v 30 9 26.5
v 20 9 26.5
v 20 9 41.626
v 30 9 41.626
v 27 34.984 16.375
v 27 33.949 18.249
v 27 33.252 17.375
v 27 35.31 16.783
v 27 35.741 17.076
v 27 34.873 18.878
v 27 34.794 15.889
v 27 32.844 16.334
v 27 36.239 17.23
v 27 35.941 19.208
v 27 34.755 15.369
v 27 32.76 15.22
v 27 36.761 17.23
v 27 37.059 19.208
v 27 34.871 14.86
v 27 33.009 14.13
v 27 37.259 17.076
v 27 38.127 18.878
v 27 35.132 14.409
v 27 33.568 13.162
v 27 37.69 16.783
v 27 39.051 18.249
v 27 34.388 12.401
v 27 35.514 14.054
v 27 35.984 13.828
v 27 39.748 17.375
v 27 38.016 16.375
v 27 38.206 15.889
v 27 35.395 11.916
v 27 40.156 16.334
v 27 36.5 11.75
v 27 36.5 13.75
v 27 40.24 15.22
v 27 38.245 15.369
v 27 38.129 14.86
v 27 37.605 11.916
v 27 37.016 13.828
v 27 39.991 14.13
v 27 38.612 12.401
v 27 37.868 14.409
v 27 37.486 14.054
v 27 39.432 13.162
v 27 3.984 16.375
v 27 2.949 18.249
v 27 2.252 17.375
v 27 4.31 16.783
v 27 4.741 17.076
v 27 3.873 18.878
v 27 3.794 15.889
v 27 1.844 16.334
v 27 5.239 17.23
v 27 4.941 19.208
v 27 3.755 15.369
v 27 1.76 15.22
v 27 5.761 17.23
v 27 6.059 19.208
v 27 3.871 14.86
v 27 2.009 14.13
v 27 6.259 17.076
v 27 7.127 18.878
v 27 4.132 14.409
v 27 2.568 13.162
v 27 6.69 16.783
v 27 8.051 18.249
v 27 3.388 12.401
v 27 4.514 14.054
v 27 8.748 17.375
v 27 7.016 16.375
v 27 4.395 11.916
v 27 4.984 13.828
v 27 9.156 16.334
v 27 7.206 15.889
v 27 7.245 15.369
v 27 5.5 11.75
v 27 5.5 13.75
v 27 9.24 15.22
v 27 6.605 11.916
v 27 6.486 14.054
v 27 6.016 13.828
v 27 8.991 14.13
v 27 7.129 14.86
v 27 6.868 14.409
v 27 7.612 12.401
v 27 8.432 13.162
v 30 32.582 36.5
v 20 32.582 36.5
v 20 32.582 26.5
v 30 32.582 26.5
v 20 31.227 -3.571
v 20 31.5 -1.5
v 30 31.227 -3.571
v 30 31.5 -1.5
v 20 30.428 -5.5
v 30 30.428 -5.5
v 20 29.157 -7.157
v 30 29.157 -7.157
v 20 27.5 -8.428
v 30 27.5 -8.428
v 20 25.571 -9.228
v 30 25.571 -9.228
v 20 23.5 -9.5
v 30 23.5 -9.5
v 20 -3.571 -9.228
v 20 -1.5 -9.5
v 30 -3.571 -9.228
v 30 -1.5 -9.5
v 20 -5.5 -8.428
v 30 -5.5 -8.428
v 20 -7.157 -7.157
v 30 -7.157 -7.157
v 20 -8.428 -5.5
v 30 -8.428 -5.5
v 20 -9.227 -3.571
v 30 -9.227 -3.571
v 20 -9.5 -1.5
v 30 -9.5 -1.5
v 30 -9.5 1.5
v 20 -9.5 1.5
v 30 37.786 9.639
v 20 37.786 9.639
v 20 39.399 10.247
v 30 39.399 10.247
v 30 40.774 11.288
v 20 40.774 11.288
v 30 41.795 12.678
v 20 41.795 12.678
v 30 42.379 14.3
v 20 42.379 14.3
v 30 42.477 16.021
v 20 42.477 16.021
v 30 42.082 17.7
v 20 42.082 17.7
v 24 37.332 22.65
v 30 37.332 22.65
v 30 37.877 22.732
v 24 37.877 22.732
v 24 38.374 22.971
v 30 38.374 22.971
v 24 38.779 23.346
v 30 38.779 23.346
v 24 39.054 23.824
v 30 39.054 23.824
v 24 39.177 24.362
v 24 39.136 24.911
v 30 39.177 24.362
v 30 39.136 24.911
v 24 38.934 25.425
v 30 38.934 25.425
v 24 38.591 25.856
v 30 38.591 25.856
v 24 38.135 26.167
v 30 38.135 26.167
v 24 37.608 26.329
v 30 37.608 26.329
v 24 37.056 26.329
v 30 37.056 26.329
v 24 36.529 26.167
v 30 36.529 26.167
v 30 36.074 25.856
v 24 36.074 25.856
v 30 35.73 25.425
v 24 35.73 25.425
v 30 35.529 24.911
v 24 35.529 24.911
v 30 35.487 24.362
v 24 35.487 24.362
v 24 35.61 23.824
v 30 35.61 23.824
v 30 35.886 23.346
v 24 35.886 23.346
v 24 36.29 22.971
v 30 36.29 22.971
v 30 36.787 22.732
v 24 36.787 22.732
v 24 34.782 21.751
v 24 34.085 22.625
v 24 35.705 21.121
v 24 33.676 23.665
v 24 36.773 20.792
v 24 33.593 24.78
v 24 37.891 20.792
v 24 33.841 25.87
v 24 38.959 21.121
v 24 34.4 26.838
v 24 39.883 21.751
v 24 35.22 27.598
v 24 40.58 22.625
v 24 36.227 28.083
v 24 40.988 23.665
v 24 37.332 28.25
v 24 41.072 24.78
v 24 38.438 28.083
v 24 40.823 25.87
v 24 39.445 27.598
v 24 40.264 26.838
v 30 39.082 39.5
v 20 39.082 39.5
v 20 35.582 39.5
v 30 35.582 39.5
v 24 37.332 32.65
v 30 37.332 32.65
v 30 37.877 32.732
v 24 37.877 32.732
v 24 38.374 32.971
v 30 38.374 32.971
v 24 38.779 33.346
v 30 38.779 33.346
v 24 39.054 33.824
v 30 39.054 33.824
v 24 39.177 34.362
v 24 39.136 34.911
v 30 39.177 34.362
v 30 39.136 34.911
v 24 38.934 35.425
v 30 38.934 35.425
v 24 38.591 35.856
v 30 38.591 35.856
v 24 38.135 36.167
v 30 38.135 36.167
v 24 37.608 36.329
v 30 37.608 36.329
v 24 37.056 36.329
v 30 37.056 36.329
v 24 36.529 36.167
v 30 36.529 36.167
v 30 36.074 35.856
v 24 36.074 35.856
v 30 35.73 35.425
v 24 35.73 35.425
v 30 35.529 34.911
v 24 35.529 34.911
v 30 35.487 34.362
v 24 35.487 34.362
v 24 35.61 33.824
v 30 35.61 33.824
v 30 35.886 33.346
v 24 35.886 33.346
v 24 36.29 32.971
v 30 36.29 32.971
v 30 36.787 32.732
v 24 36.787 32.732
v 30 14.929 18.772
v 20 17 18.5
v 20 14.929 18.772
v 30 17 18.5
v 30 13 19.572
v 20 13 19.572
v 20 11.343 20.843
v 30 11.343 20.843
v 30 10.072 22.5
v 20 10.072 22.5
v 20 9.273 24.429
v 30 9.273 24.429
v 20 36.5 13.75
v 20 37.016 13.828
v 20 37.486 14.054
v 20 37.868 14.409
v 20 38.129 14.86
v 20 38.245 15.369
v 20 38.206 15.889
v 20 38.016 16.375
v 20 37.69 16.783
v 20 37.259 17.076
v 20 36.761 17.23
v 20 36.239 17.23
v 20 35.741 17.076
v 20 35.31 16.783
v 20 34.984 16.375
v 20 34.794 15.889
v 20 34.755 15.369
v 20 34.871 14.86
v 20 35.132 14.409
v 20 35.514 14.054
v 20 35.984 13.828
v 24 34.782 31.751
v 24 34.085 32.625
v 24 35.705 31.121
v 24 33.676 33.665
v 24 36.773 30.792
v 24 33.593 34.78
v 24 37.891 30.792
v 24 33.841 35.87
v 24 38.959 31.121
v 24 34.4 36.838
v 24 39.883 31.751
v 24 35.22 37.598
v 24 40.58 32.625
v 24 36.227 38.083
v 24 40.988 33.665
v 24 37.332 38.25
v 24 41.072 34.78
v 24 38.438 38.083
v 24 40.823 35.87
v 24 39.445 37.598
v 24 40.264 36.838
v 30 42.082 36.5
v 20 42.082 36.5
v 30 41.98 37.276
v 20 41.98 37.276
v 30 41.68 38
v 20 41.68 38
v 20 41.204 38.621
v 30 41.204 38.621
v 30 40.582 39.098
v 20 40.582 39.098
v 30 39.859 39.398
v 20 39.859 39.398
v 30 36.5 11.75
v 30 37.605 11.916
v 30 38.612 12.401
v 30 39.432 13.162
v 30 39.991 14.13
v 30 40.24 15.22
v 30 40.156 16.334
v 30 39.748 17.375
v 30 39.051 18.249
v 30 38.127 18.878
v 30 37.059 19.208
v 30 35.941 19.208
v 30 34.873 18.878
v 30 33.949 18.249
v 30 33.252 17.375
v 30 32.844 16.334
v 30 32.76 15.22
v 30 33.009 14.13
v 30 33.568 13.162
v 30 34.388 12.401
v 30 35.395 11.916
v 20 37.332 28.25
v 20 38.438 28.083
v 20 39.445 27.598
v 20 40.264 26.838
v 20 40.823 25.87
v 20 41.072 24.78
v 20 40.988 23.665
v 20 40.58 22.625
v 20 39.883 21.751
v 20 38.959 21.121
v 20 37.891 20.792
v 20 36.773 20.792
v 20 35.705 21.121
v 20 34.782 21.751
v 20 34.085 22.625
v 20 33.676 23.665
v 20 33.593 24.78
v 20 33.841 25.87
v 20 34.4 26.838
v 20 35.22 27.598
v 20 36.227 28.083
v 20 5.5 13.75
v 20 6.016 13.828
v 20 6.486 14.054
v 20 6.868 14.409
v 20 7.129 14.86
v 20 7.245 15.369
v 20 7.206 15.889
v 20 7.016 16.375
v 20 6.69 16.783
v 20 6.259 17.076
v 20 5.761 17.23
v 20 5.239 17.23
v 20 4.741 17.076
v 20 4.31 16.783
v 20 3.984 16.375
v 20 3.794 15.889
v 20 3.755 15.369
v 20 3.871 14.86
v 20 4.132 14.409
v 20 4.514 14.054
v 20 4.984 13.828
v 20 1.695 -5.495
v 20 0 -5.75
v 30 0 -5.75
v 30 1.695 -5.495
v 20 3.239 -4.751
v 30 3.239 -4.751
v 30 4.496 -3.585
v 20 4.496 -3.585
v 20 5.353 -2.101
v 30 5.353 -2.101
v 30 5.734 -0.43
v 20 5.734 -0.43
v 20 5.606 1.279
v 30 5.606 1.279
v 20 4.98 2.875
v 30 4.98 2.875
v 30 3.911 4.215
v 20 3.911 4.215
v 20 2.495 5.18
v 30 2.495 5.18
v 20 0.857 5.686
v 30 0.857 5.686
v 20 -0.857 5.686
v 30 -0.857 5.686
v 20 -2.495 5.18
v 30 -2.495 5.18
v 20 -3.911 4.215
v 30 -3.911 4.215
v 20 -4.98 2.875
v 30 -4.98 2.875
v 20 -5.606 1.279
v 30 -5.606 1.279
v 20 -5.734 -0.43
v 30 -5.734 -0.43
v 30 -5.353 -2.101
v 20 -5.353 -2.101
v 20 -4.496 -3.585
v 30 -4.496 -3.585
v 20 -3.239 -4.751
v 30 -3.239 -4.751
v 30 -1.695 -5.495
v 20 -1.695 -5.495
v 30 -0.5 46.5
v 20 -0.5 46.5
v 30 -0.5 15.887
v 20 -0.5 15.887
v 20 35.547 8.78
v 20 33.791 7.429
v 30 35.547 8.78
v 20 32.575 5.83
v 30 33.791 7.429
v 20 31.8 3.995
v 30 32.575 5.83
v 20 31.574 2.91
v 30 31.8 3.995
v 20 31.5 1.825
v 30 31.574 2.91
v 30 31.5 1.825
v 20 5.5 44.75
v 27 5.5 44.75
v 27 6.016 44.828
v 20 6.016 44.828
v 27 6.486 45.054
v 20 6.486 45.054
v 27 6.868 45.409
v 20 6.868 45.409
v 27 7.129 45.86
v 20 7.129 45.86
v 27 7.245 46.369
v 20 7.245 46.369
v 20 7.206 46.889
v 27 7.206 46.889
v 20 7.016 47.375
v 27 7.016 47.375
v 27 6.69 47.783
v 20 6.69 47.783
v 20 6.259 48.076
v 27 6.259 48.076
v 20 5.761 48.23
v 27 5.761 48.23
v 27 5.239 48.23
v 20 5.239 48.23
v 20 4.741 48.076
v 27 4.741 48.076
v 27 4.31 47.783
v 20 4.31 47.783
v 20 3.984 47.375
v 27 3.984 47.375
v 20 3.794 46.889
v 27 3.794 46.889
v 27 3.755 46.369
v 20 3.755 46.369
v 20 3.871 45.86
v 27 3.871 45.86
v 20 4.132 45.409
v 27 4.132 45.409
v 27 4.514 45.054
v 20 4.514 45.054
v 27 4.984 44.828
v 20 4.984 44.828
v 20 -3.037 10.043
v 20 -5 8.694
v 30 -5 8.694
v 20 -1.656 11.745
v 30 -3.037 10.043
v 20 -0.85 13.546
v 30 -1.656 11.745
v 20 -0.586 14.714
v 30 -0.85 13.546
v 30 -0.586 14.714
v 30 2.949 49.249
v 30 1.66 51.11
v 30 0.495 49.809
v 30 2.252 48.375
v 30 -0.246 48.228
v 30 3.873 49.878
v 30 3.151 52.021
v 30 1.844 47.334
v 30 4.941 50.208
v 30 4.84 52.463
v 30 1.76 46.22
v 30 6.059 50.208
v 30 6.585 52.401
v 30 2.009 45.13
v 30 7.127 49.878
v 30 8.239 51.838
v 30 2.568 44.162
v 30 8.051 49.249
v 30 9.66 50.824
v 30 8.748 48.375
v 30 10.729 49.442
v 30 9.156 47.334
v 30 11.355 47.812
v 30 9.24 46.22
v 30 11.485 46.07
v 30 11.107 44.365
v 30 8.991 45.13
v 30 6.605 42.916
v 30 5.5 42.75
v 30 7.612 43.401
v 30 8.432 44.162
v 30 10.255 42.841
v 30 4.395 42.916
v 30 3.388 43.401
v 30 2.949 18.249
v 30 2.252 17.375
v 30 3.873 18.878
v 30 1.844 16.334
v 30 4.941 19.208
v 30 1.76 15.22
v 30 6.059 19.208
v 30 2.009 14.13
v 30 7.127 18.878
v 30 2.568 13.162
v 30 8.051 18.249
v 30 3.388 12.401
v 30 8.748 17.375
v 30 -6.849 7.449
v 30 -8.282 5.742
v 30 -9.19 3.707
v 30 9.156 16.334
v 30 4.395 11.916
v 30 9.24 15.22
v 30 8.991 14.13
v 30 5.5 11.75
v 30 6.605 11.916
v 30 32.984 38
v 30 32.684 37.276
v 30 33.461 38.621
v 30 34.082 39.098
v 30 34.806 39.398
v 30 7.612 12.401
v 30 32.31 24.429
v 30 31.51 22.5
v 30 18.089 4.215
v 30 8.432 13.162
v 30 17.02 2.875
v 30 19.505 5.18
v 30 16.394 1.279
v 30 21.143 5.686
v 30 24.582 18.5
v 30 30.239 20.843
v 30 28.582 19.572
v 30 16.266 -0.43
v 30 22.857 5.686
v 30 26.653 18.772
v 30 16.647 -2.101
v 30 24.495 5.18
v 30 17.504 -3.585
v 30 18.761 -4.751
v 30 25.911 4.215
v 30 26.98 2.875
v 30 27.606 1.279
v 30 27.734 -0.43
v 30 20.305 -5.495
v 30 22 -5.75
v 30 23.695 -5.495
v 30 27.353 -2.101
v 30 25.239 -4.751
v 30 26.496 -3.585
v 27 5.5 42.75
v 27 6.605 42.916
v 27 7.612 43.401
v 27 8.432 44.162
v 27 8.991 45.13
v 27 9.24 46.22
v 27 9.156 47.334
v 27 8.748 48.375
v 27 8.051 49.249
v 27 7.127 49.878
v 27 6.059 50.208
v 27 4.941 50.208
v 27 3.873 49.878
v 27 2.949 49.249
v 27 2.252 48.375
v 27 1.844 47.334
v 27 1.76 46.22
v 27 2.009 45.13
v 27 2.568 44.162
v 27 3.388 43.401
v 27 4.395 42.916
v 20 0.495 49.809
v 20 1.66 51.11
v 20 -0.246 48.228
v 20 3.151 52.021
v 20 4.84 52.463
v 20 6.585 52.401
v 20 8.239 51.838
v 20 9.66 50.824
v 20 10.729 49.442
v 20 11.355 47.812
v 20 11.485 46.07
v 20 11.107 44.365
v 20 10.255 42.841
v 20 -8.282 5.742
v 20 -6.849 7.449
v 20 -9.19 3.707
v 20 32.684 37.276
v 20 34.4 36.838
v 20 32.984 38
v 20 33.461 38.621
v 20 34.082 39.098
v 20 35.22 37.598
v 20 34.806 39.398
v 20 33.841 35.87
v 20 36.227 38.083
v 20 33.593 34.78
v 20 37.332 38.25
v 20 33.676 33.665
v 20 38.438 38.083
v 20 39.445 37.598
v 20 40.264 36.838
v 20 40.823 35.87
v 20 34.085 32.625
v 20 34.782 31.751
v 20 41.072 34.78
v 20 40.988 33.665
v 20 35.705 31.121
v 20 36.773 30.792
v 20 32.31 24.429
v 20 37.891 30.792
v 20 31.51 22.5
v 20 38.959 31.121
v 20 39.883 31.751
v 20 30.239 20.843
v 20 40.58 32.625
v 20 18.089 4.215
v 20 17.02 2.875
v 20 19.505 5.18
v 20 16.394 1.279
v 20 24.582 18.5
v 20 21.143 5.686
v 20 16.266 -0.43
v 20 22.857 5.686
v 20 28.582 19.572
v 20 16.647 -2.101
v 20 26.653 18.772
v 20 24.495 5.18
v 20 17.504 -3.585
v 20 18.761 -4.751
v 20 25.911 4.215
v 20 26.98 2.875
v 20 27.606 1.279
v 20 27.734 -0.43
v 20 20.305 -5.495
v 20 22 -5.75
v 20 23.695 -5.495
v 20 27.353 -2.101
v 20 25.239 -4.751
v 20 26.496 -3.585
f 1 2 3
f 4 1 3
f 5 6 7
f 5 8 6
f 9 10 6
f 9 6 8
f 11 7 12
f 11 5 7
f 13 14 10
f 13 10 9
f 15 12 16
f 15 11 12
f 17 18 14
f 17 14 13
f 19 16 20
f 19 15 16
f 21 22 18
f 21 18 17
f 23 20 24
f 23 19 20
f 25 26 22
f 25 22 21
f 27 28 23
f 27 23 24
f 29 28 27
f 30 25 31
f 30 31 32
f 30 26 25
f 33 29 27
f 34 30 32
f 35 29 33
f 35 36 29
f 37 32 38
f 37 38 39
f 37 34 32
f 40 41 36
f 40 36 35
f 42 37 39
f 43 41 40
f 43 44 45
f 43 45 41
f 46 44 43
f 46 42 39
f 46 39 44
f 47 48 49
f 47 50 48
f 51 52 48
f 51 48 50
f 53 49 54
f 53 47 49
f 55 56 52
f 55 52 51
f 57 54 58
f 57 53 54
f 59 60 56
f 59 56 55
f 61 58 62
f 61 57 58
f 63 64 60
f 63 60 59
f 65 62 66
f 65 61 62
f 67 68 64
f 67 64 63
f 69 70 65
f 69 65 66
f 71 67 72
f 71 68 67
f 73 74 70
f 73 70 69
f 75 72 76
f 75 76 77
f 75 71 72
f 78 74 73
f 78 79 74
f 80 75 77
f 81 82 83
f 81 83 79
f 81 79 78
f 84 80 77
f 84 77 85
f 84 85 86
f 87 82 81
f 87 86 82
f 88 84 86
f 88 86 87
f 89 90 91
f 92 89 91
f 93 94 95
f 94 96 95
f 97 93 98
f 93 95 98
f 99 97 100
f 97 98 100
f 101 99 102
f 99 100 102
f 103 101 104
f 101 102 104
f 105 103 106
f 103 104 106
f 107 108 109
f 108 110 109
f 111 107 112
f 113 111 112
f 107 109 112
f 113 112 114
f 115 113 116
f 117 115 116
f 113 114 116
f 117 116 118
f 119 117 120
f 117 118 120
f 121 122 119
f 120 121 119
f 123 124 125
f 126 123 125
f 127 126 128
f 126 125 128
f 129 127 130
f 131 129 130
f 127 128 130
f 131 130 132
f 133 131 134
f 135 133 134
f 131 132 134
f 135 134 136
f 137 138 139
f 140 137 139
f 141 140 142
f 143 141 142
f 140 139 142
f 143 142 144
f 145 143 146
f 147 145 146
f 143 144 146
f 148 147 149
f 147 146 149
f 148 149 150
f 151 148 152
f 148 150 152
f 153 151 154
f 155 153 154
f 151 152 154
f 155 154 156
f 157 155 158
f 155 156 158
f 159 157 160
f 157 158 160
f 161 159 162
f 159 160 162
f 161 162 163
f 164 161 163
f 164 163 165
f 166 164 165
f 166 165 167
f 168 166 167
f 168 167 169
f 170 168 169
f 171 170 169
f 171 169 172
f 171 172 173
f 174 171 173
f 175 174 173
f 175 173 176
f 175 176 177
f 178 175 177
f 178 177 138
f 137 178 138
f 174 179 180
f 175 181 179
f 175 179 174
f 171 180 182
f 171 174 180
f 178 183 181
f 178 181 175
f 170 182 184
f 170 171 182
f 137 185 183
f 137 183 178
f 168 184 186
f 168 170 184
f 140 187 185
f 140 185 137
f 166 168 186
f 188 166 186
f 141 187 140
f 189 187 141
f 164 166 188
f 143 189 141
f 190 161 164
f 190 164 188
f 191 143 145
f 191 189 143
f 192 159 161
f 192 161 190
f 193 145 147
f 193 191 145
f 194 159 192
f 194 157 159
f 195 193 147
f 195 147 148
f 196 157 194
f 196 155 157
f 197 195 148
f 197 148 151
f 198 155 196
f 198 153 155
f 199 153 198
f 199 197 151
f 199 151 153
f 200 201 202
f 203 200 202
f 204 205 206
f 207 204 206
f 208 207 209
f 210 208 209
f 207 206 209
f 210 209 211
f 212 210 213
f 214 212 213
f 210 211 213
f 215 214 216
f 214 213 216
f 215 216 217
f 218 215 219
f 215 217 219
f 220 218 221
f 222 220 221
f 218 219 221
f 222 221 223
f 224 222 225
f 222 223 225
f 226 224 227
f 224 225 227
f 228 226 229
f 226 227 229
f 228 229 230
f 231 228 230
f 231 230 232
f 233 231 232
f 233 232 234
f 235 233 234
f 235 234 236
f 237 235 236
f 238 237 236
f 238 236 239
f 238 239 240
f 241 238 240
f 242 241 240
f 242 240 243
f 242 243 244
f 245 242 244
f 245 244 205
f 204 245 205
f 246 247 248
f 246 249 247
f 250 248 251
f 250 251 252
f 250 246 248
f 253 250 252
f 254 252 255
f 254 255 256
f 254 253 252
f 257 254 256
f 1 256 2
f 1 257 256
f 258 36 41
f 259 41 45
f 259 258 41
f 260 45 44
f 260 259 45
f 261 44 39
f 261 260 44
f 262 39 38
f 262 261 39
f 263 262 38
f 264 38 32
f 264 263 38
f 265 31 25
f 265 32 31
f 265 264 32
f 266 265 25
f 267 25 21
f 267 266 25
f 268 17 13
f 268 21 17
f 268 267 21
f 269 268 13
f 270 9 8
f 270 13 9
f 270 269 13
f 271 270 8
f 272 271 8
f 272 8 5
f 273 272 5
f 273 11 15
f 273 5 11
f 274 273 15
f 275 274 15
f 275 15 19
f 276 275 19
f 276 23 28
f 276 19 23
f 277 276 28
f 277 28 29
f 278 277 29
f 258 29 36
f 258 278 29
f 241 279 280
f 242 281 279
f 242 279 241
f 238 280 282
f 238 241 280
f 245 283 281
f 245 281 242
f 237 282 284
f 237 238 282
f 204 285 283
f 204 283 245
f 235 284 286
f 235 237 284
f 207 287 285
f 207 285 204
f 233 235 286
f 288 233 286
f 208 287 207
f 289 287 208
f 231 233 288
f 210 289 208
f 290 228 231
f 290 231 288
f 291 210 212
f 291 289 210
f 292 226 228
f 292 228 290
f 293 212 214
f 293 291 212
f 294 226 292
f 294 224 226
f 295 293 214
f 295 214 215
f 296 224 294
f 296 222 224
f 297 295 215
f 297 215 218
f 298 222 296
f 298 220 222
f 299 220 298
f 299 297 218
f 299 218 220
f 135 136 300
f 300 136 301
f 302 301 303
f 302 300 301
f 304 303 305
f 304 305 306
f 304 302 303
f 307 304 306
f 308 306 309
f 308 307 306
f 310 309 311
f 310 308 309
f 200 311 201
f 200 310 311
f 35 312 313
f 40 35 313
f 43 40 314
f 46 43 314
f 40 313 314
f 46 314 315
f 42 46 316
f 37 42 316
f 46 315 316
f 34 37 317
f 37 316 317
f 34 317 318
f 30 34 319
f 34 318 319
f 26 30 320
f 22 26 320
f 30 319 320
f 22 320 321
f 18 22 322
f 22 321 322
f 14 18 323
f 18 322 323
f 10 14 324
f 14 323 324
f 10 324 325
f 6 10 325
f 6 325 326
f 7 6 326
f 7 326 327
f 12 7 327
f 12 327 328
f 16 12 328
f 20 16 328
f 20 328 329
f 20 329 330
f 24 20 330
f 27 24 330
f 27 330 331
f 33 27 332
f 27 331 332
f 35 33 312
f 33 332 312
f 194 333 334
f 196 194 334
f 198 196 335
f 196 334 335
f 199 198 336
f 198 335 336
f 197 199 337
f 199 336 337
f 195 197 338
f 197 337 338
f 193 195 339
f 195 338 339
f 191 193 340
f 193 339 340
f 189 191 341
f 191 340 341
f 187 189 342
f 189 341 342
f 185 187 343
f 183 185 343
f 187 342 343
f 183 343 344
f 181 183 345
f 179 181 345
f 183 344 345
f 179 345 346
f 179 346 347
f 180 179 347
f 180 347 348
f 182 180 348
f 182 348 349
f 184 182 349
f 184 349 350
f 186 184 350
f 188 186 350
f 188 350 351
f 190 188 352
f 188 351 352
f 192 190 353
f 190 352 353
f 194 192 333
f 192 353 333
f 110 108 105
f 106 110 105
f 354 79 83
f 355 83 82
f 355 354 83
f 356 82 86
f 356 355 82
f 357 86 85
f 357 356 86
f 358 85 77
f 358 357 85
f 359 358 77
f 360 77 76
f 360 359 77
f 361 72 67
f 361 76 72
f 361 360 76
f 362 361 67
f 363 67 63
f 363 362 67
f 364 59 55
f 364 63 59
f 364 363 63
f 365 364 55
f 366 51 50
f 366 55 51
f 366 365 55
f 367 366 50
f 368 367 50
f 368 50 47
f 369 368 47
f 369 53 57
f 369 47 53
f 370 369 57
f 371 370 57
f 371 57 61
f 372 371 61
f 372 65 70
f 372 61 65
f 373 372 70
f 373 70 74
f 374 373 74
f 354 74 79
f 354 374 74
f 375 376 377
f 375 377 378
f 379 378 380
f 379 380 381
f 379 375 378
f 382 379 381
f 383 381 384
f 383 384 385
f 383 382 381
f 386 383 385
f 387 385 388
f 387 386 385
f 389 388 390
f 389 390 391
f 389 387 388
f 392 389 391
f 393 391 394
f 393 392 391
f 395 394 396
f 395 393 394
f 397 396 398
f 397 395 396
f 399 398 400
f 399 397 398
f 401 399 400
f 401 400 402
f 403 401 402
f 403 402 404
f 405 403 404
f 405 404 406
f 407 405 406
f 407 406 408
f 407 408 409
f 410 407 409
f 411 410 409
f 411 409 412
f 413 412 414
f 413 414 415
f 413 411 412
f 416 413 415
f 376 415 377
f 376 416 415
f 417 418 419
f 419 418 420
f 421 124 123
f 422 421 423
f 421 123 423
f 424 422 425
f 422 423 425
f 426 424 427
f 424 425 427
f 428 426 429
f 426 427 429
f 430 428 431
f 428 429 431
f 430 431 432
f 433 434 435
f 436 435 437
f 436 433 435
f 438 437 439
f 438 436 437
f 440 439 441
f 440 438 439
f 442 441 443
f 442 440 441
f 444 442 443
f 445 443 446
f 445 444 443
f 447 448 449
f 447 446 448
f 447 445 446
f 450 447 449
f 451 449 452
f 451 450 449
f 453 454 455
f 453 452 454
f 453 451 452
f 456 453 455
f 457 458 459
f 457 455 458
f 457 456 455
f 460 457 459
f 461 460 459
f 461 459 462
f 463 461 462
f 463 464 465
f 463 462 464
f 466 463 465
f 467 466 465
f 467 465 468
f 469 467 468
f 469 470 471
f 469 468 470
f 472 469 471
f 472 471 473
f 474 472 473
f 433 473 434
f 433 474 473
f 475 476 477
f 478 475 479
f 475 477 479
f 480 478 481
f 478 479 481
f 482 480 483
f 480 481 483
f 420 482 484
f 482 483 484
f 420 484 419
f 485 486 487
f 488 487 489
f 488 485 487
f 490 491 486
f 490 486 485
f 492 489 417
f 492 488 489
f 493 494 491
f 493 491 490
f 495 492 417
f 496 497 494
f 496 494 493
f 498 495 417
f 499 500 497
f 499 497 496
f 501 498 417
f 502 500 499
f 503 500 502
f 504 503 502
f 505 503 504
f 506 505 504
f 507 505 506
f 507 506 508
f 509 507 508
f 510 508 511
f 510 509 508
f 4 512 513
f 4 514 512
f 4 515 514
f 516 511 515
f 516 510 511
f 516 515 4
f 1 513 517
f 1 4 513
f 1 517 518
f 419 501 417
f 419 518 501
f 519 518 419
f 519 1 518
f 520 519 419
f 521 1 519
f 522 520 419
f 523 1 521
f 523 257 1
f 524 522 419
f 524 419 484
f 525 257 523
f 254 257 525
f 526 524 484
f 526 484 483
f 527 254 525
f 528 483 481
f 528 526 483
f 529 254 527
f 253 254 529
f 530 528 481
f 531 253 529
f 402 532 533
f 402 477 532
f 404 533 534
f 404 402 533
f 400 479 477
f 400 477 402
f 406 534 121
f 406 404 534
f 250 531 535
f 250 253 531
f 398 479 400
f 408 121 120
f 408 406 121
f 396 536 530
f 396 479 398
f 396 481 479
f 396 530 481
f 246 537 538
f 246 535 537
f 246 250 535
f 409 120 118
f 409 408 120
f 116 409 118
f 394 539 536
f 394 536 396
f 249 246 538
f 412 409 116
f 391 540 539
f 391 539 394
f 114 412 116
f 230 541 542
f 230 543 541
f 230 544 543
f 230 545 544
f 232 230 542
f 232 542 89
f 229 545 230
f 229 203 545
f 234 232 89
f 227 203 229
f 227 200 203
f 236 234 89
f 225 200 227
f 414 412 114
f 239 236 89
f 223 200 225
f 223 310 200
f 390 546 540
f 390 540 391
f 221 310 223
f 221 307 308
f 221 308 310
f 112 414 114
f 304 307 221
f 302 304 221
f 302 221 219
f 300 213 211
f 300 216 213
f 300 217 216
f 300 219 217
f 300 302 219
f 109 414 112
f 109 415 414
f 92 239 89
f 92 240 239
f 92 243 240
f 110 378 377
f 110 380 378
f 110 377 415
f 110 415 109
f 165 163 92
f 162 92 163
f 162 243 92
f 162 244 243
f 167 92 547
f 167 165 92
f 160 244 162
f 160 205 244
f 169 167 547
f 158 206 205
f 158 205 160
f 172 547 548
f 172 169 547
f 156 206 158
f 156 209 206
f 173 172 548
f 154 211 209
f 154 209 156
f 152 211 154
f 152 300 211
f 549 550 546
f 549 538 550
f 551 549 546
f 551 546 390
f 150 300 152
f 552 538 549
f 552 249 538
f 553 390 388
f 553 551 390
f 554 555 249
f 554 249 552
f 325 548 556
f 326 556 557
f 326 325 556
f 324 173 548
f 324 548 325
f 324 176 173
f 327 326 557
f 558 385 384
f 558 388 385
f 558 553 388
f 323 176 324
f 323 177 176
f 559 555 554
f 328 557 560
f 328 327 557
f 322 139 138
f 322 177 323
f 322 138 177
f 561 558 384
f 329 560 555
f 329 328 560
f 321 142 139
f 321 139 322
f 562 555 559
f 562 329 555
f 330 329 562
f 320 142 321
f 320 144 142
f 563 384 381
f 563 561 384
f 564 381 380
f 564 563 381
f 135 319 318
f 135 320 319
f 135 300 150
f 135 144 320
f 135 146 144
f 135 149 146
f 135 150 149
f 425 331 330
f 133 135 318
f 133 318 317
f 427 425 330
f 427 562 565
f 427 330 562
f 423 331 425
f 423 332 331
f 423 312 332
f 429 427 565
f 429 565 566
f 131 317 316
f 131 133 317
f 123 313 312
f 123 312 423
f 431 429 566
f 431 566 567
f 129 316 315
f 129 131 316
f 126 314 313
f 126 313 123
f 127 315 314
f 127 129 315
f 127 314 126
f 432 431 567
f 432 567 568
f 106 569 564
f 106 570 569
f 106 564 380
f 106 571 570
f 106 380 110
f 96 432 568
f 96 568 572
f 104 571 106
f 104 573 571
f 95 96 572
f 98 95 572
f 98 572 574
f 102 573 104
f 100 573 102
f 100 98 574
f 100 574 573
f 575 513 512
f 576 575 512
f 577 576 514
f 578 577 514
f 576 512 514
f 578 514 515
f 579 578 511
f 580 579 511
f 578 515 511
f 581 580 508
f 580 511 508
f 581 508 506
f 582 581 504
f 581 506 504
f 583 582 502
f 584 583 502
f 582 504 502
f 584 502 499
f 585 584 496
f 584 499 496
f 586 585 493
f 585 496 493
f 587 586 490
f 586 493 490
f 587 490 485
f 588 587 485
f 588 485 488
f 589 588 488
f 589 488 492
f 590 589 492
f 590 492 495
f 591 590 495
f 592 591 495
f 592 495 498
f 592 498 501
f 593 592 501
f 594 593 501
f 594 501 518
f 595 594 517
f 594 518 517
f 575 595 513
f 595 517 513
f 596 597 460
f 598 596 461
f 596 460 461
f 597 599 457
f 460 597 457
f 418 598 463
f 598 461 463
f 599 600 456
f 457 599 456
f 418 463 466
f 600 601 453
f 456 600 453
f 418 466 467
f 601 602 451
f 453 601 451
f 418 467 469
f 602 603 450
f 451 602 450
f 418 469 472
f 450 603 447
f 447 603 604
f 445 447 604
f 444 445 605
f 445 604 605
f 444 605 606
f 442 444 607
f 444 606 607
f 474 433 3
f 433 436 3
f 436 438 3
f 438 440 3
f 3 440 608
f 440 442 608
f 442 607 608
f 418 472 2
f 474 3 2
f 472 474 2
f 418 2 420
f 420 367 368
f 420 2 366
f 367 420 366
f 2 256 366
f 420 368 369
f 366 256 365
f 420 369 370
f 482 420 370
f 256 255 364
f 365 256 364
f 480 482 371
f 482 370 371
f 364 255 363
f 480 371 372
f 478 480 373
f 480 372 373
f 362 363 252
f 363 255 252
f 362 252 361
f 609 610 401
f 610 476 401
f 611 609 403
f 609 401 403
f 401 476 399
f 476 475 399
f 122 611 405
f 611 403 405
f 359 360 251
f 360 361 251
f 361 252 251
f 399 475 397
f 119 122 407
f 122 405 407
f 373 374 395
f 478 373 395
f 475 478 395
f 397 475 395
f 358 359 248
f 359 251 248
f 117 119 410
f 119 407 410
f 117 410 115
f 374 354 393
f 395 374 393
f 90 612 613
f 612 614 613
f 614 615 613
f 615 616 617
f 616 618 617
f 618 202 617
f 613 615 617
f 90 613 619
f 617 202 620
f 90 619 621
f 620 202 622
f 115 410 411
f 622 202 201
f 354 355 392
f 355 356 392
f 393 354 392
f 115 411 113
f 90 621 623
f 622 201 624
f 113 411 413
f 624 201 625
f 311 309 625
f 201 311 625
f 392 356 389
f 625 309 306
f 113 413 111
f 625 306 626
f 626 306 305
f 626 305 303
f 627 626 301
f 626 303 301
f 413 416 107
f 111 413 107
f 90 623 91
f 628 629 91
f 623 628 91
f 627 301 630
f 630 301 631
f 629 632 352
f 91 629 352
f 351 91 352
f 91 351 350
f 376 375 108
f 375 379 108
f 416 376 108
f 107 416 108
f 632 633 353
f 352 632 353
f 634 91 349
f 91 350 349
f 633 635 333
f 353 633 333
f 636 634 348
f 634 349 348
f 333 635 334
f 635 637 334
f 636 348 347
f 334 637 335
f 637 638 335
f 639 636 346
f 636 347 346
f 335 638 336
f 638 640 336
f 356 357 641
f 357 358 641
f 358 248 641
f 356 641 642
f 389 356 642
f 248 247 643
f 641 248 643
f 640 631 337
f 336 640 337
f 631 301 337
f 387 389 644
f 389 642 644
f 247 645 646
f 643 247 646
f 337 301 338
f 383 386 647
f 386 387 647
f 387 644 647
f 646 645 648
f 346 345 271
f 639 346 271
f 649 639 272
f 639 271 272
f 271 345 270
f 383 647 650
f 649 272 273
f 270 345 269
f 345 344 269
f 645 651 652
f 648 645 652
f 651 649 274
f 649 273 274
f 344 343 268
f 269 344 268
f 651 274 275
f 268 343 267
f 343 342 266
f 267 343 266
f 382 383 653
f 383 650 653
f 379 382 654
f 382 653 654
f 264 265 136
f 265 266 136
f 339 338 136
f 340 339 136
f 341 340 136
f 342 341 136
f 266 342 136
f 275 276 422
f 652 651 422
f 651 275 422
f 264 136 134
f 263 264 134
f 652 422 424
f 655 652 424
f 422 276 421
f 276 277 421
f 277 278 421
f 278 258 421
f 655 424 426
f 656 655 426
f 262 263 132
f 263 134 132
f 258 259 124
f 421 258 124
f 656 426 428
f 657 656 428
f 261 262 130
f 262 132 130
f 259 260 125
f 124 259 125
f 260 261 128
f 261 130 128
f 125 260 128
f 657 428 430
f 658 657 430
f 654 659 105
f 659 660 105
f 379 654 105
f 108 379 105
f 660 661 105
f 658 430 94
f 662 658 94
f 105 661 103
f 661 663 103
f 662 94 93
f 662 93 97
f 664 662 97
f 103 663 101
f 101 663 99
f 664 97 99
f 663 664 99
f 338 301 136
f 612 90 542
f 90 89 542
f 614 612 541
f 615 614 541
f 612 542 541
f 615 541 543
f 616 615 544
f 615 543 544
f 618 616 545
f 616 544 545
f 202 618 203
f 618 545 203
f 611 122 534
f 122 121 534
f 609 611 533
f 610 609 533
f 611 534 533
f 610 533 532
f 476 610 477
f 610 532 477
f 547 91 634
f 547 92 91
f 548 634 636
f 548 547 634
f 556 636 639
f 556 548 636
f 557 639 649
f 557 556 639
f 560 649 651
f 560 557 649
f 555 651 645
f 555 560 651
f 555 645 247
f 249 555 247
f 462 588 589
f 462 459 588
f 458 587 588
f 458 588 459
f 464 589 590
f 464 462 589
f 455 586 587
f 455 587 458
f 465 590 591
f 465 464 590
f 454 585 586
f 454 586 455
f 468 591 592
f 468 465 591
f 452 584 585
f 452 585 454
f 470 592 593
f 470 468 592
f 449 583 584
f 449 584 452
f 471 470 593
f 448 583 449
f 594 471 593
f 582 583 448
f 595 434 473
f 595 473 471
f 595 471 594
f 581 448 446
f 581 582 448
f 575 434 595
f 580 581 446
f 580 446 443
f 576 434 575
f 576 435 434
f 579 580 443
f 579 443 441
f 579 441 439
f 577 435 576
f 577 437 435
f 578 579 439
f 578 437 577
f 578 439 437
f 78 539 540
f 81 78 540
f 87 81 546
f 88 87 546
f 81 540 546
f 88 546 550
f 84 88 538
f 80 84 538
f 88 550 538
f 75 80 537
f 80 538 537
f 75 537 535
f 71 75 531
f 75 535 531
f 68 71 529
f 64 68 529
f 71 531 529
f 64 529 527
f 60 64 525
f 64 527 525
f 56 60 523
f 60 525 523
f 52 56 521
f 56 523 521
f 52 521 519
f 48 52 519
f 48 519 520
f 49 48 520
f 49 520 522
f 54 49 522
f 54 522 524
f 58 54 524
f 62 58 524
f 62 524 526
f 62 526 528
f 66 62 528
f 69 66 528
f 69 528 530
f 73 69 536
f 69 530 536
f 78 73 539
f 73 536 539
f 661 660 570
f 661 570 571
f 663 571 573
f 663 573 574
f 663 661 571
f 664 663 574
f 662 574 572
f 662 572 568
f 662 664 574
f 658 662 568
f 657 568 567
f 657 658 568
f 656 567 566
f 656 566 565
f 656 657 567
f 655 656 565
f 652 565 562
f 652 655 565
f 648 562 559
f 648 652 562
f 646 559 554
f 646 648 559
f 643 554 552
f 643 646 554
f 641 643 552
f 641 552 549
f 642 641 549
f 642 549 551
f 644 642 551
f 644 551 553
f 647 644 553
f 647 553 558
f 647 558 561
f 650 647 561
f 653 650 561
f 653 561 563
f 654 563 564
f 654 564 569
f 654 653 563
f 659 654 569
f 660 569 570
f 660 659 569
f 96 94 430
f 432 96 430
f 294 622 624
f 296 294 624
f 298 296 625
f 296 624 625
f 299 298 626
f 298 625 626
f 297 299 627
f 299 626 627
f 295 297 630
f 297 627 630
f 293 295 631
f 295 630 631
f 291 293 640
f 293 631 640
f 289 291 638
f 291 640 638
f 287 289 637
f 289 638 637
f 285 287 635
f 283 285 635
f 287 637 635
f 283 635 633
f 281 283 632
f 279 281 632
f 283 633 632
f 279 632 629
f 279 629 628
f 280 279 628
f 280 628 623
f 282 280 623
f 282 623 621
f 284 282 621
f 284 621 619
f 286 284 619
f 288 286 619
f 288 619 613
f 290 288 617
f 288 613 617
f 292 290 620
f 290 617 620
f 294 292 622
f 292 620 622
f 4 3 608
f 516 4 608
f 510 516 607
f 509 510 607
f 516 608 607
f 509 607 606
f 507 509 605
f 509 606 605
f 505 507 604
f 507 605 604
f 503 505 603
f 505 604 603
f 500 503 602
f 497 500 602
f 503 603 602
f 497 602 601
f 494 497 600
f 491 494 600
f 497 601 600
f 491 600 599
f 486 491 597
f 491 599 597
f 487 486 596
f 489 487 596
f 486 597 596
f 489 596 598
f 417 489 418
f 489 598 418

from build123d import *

# Parameters (mm, degrees)
SKETCH1_R           = 1.75
SKETCH1_R_2         = 5.75
BOSS_EXTRUDE3_DEPTH = 10
FILLET1_R           = 8
SKETCH6_R           = 3.75
CUT_EXTRUDE2_DEPTH  = 3
FILLET2_R           = 8
FILLET3_R           = 3
SKETCH8_R           = 1.85
CUT_EXTRUDE3_DEPTH  = 69.282336686
SKETCH9_R           = 3.75
CUT_EXTRUDE4_DEPTH  = 4


with BuildPart() as part:
    # Sketch1 → Boss-Extrude3 (new body)
    with BuildSketch(Plane(origin=(20, 0, 0), x_dir=(0, 0, -1), z_dir=(1, 0, 0))):
        with BuildLine():
            Line((-17.699617141, 42.082180663), (-39.499785546, 42.082180663))
            Line((-39.499785546, 42.082180663), (-39.499785546, 32.582180663))
            Line((-39.499785546, 32.582180663), (-18.499785546, 32.582180663))
            Line((-18.499785546, 32.582180663), (-18.499785546, 9))
            Line((-18.499785546, 9), (-41.626388373, 9))
            ThreePointArc((-41.626388373, 9), (-51.838324672, 8.238612788), (-46.499785546, -0.5))
            Line((-46.499785546, -0.5), (-9.499785546, -0.5))
            Line((-9.499785546, -0.5), (-9.499785546, -9.5))
            Line((-9.499785546, -9.5), (9.500214454, -9.5))
            Line((9.500214454, -9.5), (9.500214454, 31.5))
            Line((9.500214454, 31.5), (-9.499785546, 31.5))
            Line((-9.499785546, 31.5), (-9.499785546, 36.5))
            ThreePointArc((-9.499785546, 36.5), (-12.123322128, 41.459787776), (-17.699617141, 42.082180663))
        make_face()
        with Locations((-15.499785546, 36.5)):
            Circle(SKETCH1_R, mode=Mode.SUBTRACT)
        with Locations((0.000214454, 22)):
            Circle(SKETCH1_R_2, mode=Mode.SUBTRACT)
        with Locations((0.000214454, 0)):
            Circle(SKETCH1_R_2, mode=Mode.SUBTRACT)
        with Locations((-15.499785546, 5.5)):
            Circle(SKETCH1_R, mode=Mode.SUBTRACT)
        with Locations((-46.499785546, 5.5)):
            Circle(SKETCH1_R, mode=Mode.SUBTRACT)
    extrude(amount=BOSS_EXTRUDE3_DEPTH)

    # Fillet1
    fillet1_edges = [part.edges().sort_by_distance(p)[0] for p in [
        (25, -9.5, 9.499785546),
        (25, -9.5, -9.500214454),
        (25, 31.5, -9.500214454),
        (25, 9, 18.499785546),
        (25, 31.5, 9.499785546),
        (25, 32.582180663, 18.499785546),
    ]]
    fillet(fillet1_edges, radius=FILLET1_R)

    # Sketch6 → Cut-Extrude2 (cut)
    with BuildSketch(Plane(origin=(30, 0, 0), x_dir=(0, 0, -1), z_dir=(1, 0, 0))):
        with Locations((-15.499785546, 36.5)):
            Circle(SKETCH6_R)
        with Locations((-15.499785546, 5.5)):
            Circle(SKETCH6_R)
        with Locations((-46.499785546, 5.5)):
            Circle(SKETCH6_R)
    extrude(amount=-CUT_EXTRUDE2_DEPTH, mode=Mode.SUBTRACT)

    # Fillet2
    fillet2_edges = [part.edges().sort_by_distance(p)[0] for p in [
        (25, -0.5, 9.499785546),
    ]]
    fillet(fillet2_edges, radius=FILLET2_R)

    # Fillet3
    fillet3_edges = [part.edges().sort_by_distance(p)[0] for p in [
        (25, 32.582180663, 39.499785546),
        (25, 42.082180663, 39.499785546),
    ]]
    fillet(fillet3_edges, radius=FILLET3_R)

    # Sketch8 → Cut-Extrude3 (cut, through all)
    with BuildSketch(Plane(origin=(30, 0, 0), x_dir=(0, 0, -1), z_dir=(1, 0, 0))):
        with Locations((-34.499785546, 37.332180663)):
            Circle(SKETCH8_R)
        with Locations((-24.499785546, 37.332180663)):
            Circle(SKETCH8_R)
    extrude(amount=-CUT_EXTRUDE3_DEPTH, mode=Mode.SUBTRACT)

    # Sketch9 → Cut-Extrude4 (cut)
    with BuildSketch(Plane.ZY.offset(-20)):
        with Locations((24.499785546, 37.332180663)):
            Circle(SKETCH9_R)
        with Locations((34.499785546, 37.332180663)):
            Circle(SKETCH9_R)
    extrude(amount=-CUT_EXTRUDE4_DEPTH, mode=Mode.SUBTRACT)


solid = part.part
